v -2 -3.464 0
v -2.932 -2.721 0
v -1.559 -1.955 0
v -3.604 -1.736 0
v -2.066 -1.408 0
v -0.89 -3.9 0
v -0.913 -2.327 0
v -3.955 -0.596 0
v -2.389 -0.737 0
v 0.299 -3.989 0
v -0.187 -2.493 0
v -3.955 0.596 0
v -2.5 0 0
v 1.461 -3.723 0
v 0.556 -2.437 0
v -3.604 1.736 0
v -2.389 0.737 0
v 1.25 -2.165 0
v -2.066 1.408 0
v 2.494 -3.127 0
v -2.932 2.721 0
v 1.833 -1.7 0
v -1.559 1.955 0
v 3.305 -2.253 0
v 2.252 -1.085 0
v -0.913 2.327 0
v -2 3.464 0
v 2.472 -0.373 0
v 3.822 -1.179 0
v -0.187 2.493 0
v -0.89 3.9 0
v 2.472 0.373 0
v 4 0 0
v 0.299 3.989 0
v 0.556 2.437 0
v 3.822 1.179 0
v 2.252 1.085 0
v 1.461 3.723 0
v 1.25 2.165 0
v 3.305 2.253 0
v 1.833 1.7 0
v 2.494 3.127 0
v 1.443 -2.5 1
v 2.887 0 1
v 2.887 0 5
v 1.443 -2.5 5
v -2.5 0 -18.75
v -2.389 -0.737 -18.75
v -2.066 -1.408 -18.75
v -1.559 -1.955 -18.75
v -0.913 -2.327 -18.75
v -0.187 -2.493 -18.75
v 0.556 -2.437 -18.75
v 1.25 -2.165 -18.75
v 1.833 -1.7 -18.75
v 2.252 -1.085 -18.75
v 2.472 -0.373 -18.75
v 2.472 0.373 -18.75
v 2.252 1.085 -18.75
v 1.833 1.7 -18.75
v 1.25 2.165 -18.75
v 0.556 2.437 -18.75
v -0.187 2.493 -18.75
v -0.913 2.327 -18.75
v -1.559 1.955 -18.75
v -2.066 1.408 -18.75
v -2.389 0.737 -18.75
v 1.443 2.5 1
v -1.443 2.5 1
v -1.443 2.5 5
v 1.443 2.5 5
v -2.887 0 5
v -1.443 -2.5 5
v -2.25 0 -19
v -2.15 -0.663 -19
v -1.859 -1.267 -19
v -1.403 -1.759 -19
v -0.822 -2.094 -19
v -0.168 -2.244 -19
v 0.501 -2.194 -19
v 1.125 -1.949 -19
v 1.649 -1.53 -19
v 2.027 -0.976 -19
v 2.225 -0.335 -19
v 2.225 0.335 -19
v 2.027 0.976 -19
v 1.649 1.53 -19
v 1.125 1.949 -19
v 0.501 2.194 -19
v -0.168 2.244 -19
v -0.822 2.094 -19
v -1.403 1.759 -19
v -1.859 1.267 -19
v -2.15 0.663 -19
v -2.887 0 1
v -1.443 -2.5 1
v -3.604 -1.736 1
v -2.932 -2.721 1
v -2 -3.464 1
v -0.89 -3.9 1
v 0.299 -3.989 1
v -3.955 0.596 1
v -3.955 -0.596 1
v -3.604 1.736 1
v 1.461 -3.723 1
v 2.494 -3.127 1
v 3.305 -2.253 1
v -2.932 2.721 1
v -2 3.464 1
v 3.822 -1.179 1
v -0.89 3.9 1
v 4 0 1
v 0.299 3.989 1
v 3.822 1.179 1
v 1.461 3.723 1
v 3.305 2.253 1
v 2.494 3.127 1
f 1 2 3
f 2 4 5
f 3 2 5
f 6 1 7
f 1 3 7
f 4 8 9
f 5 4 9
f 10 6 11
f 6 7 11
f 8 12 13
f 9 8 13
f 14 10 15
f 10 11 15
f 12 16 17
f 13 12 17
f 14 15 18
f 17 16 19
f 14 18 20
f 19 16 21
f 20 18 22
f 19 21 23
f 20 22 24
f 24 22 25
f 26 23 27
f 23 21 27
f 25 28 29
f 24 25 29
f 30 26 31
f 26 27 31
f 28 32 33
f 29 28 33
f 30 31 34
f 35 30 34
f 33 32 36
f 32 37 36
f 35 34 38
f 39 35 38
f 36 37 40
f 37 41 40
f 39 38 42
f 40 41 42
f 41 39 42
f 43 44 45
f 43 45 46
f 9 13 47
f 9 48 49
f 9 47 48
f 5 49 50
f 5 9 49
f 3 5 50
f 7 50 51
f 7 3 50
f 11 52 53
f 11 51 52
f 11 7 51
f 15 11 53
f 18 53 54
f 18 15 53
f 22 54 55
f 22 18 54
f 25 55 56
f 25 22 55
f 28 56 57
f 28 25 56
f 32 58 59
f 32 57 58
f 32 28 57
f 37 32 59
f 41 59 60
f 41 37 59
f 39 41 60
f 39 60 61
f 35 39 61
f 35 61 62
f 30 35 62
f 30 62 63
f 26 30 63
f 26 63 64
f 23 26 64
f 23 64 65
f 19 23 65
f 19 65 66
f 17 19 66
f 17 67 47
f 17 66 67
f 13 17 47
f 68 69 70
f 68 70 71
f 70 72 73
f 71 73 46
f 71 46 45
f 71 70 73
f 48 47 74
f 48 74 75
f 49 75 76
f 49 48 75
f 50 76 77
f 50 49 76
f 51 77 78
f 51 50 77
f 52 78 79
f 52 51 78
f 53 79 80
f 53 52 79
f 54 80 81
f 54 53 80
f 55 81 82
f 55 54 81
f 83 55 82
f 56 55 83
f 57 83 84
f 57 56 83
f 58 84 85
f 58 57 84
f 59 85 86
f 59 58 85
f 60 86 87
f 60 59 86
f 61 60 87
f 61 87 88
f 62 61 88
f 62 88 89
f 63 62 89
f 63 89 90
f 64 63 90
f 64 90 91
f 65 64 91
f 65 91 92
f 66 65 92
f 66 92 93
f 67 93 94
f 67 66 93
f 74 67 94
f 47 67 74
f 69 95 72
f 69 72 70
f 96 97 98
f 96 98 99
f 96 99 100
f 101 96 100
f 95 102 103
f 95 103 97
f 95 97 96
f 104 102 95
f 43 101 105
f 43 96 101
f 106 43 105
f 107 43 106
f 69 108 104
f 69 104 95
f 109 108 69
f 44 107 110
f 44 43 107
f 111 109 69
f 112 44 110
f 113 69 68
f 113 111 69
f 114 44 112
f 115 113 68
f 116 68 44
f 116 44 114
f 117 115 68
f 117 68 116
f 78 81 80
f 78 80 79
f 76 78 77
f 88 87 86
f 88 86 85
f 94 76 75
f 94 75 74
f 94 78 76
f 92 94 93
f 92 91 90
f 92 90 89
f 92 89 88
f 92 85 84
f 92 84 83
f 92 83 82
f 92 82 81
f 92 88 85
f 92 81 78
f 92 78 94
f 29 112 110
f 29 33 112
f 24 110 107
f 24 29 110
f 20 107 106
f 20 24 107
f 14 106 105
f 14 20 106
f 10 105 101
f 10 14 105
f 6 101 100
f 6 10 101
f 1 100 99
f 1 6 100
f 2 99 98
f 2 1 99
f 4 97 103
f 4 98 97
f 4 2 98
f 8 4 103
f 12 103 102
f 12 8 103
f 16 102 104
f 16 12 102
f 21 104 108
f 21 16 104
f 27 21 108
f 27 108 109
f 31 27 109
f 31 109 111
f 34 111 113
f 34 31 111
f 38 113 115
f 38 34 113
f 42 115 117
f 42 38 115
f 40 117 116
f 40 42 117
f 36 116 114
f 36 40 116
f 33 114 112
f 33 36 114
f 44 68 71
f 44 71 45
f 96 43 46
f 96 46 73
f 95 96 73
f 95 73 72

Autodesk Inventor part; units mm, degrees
ref_plane "YZ Plane" through (0, 0, 0) normal (1, 0, 0) x (0, 1, 0)
ref_plane "XZ Plane" through (0, 0, 0) normal (0, 1, 0) x (-1, 0, 0)
ref_plane "XY Plane" through (0, 0, 0) normal (0, 0, 1) x (1, 0, 0)
sketch "草图1" plane through (0, 0, 0) normal (0, 0, 1) x (1, 0, 0)
  circle A0 centre (0, 0) radius 4
  dimension "d0" = 8
extrude "拉伸1" add sketch "草图1" along normal blind 1
sketch "草图2" plane through (0, 0, 1) normal (0, 0, 1) x (1, 0, 0)
  line L0 (1.4434, -2.5) -> (-1.4434, -2.5)
  line L1 (-1.4434, -2.5) -> (-2.8868, 0)
  line L2 (-2.8868, 0) -> (-1.4434, 2.5)
  line L3 (-1.4434, 2.5) -> (1.4434, 2.5)
  line L4 (1.4434, 2.5) -> (2.8868, 0)
  line L5 (2.8868, 0) -> (1.4434, -2.5)
  line L6 (0, 0) -> (0, 2.5)
  dimension "d3" = 5
extrude "拉伸2" add sketch "草图2" along normal blind 4
sketch "草图3" plane through (0, 0, 0) normal (0, 0, -1) x (-1, 0, 0)
  circle A0 centre (0, 0) radius 2.5
  dimension "d6" = 5
extrude "拉伸3" add sketch "草图3" along normal blind 19
thread "螺纹1" size "M5x0.8" class "6g" standard "ANSI Metric M Profile" length 15
chamfer "倒角1" distance 0.25 angle 45 1 edges at (2.5, 0, -19)
properties part number "电机座上轴盖固定螺丝"
